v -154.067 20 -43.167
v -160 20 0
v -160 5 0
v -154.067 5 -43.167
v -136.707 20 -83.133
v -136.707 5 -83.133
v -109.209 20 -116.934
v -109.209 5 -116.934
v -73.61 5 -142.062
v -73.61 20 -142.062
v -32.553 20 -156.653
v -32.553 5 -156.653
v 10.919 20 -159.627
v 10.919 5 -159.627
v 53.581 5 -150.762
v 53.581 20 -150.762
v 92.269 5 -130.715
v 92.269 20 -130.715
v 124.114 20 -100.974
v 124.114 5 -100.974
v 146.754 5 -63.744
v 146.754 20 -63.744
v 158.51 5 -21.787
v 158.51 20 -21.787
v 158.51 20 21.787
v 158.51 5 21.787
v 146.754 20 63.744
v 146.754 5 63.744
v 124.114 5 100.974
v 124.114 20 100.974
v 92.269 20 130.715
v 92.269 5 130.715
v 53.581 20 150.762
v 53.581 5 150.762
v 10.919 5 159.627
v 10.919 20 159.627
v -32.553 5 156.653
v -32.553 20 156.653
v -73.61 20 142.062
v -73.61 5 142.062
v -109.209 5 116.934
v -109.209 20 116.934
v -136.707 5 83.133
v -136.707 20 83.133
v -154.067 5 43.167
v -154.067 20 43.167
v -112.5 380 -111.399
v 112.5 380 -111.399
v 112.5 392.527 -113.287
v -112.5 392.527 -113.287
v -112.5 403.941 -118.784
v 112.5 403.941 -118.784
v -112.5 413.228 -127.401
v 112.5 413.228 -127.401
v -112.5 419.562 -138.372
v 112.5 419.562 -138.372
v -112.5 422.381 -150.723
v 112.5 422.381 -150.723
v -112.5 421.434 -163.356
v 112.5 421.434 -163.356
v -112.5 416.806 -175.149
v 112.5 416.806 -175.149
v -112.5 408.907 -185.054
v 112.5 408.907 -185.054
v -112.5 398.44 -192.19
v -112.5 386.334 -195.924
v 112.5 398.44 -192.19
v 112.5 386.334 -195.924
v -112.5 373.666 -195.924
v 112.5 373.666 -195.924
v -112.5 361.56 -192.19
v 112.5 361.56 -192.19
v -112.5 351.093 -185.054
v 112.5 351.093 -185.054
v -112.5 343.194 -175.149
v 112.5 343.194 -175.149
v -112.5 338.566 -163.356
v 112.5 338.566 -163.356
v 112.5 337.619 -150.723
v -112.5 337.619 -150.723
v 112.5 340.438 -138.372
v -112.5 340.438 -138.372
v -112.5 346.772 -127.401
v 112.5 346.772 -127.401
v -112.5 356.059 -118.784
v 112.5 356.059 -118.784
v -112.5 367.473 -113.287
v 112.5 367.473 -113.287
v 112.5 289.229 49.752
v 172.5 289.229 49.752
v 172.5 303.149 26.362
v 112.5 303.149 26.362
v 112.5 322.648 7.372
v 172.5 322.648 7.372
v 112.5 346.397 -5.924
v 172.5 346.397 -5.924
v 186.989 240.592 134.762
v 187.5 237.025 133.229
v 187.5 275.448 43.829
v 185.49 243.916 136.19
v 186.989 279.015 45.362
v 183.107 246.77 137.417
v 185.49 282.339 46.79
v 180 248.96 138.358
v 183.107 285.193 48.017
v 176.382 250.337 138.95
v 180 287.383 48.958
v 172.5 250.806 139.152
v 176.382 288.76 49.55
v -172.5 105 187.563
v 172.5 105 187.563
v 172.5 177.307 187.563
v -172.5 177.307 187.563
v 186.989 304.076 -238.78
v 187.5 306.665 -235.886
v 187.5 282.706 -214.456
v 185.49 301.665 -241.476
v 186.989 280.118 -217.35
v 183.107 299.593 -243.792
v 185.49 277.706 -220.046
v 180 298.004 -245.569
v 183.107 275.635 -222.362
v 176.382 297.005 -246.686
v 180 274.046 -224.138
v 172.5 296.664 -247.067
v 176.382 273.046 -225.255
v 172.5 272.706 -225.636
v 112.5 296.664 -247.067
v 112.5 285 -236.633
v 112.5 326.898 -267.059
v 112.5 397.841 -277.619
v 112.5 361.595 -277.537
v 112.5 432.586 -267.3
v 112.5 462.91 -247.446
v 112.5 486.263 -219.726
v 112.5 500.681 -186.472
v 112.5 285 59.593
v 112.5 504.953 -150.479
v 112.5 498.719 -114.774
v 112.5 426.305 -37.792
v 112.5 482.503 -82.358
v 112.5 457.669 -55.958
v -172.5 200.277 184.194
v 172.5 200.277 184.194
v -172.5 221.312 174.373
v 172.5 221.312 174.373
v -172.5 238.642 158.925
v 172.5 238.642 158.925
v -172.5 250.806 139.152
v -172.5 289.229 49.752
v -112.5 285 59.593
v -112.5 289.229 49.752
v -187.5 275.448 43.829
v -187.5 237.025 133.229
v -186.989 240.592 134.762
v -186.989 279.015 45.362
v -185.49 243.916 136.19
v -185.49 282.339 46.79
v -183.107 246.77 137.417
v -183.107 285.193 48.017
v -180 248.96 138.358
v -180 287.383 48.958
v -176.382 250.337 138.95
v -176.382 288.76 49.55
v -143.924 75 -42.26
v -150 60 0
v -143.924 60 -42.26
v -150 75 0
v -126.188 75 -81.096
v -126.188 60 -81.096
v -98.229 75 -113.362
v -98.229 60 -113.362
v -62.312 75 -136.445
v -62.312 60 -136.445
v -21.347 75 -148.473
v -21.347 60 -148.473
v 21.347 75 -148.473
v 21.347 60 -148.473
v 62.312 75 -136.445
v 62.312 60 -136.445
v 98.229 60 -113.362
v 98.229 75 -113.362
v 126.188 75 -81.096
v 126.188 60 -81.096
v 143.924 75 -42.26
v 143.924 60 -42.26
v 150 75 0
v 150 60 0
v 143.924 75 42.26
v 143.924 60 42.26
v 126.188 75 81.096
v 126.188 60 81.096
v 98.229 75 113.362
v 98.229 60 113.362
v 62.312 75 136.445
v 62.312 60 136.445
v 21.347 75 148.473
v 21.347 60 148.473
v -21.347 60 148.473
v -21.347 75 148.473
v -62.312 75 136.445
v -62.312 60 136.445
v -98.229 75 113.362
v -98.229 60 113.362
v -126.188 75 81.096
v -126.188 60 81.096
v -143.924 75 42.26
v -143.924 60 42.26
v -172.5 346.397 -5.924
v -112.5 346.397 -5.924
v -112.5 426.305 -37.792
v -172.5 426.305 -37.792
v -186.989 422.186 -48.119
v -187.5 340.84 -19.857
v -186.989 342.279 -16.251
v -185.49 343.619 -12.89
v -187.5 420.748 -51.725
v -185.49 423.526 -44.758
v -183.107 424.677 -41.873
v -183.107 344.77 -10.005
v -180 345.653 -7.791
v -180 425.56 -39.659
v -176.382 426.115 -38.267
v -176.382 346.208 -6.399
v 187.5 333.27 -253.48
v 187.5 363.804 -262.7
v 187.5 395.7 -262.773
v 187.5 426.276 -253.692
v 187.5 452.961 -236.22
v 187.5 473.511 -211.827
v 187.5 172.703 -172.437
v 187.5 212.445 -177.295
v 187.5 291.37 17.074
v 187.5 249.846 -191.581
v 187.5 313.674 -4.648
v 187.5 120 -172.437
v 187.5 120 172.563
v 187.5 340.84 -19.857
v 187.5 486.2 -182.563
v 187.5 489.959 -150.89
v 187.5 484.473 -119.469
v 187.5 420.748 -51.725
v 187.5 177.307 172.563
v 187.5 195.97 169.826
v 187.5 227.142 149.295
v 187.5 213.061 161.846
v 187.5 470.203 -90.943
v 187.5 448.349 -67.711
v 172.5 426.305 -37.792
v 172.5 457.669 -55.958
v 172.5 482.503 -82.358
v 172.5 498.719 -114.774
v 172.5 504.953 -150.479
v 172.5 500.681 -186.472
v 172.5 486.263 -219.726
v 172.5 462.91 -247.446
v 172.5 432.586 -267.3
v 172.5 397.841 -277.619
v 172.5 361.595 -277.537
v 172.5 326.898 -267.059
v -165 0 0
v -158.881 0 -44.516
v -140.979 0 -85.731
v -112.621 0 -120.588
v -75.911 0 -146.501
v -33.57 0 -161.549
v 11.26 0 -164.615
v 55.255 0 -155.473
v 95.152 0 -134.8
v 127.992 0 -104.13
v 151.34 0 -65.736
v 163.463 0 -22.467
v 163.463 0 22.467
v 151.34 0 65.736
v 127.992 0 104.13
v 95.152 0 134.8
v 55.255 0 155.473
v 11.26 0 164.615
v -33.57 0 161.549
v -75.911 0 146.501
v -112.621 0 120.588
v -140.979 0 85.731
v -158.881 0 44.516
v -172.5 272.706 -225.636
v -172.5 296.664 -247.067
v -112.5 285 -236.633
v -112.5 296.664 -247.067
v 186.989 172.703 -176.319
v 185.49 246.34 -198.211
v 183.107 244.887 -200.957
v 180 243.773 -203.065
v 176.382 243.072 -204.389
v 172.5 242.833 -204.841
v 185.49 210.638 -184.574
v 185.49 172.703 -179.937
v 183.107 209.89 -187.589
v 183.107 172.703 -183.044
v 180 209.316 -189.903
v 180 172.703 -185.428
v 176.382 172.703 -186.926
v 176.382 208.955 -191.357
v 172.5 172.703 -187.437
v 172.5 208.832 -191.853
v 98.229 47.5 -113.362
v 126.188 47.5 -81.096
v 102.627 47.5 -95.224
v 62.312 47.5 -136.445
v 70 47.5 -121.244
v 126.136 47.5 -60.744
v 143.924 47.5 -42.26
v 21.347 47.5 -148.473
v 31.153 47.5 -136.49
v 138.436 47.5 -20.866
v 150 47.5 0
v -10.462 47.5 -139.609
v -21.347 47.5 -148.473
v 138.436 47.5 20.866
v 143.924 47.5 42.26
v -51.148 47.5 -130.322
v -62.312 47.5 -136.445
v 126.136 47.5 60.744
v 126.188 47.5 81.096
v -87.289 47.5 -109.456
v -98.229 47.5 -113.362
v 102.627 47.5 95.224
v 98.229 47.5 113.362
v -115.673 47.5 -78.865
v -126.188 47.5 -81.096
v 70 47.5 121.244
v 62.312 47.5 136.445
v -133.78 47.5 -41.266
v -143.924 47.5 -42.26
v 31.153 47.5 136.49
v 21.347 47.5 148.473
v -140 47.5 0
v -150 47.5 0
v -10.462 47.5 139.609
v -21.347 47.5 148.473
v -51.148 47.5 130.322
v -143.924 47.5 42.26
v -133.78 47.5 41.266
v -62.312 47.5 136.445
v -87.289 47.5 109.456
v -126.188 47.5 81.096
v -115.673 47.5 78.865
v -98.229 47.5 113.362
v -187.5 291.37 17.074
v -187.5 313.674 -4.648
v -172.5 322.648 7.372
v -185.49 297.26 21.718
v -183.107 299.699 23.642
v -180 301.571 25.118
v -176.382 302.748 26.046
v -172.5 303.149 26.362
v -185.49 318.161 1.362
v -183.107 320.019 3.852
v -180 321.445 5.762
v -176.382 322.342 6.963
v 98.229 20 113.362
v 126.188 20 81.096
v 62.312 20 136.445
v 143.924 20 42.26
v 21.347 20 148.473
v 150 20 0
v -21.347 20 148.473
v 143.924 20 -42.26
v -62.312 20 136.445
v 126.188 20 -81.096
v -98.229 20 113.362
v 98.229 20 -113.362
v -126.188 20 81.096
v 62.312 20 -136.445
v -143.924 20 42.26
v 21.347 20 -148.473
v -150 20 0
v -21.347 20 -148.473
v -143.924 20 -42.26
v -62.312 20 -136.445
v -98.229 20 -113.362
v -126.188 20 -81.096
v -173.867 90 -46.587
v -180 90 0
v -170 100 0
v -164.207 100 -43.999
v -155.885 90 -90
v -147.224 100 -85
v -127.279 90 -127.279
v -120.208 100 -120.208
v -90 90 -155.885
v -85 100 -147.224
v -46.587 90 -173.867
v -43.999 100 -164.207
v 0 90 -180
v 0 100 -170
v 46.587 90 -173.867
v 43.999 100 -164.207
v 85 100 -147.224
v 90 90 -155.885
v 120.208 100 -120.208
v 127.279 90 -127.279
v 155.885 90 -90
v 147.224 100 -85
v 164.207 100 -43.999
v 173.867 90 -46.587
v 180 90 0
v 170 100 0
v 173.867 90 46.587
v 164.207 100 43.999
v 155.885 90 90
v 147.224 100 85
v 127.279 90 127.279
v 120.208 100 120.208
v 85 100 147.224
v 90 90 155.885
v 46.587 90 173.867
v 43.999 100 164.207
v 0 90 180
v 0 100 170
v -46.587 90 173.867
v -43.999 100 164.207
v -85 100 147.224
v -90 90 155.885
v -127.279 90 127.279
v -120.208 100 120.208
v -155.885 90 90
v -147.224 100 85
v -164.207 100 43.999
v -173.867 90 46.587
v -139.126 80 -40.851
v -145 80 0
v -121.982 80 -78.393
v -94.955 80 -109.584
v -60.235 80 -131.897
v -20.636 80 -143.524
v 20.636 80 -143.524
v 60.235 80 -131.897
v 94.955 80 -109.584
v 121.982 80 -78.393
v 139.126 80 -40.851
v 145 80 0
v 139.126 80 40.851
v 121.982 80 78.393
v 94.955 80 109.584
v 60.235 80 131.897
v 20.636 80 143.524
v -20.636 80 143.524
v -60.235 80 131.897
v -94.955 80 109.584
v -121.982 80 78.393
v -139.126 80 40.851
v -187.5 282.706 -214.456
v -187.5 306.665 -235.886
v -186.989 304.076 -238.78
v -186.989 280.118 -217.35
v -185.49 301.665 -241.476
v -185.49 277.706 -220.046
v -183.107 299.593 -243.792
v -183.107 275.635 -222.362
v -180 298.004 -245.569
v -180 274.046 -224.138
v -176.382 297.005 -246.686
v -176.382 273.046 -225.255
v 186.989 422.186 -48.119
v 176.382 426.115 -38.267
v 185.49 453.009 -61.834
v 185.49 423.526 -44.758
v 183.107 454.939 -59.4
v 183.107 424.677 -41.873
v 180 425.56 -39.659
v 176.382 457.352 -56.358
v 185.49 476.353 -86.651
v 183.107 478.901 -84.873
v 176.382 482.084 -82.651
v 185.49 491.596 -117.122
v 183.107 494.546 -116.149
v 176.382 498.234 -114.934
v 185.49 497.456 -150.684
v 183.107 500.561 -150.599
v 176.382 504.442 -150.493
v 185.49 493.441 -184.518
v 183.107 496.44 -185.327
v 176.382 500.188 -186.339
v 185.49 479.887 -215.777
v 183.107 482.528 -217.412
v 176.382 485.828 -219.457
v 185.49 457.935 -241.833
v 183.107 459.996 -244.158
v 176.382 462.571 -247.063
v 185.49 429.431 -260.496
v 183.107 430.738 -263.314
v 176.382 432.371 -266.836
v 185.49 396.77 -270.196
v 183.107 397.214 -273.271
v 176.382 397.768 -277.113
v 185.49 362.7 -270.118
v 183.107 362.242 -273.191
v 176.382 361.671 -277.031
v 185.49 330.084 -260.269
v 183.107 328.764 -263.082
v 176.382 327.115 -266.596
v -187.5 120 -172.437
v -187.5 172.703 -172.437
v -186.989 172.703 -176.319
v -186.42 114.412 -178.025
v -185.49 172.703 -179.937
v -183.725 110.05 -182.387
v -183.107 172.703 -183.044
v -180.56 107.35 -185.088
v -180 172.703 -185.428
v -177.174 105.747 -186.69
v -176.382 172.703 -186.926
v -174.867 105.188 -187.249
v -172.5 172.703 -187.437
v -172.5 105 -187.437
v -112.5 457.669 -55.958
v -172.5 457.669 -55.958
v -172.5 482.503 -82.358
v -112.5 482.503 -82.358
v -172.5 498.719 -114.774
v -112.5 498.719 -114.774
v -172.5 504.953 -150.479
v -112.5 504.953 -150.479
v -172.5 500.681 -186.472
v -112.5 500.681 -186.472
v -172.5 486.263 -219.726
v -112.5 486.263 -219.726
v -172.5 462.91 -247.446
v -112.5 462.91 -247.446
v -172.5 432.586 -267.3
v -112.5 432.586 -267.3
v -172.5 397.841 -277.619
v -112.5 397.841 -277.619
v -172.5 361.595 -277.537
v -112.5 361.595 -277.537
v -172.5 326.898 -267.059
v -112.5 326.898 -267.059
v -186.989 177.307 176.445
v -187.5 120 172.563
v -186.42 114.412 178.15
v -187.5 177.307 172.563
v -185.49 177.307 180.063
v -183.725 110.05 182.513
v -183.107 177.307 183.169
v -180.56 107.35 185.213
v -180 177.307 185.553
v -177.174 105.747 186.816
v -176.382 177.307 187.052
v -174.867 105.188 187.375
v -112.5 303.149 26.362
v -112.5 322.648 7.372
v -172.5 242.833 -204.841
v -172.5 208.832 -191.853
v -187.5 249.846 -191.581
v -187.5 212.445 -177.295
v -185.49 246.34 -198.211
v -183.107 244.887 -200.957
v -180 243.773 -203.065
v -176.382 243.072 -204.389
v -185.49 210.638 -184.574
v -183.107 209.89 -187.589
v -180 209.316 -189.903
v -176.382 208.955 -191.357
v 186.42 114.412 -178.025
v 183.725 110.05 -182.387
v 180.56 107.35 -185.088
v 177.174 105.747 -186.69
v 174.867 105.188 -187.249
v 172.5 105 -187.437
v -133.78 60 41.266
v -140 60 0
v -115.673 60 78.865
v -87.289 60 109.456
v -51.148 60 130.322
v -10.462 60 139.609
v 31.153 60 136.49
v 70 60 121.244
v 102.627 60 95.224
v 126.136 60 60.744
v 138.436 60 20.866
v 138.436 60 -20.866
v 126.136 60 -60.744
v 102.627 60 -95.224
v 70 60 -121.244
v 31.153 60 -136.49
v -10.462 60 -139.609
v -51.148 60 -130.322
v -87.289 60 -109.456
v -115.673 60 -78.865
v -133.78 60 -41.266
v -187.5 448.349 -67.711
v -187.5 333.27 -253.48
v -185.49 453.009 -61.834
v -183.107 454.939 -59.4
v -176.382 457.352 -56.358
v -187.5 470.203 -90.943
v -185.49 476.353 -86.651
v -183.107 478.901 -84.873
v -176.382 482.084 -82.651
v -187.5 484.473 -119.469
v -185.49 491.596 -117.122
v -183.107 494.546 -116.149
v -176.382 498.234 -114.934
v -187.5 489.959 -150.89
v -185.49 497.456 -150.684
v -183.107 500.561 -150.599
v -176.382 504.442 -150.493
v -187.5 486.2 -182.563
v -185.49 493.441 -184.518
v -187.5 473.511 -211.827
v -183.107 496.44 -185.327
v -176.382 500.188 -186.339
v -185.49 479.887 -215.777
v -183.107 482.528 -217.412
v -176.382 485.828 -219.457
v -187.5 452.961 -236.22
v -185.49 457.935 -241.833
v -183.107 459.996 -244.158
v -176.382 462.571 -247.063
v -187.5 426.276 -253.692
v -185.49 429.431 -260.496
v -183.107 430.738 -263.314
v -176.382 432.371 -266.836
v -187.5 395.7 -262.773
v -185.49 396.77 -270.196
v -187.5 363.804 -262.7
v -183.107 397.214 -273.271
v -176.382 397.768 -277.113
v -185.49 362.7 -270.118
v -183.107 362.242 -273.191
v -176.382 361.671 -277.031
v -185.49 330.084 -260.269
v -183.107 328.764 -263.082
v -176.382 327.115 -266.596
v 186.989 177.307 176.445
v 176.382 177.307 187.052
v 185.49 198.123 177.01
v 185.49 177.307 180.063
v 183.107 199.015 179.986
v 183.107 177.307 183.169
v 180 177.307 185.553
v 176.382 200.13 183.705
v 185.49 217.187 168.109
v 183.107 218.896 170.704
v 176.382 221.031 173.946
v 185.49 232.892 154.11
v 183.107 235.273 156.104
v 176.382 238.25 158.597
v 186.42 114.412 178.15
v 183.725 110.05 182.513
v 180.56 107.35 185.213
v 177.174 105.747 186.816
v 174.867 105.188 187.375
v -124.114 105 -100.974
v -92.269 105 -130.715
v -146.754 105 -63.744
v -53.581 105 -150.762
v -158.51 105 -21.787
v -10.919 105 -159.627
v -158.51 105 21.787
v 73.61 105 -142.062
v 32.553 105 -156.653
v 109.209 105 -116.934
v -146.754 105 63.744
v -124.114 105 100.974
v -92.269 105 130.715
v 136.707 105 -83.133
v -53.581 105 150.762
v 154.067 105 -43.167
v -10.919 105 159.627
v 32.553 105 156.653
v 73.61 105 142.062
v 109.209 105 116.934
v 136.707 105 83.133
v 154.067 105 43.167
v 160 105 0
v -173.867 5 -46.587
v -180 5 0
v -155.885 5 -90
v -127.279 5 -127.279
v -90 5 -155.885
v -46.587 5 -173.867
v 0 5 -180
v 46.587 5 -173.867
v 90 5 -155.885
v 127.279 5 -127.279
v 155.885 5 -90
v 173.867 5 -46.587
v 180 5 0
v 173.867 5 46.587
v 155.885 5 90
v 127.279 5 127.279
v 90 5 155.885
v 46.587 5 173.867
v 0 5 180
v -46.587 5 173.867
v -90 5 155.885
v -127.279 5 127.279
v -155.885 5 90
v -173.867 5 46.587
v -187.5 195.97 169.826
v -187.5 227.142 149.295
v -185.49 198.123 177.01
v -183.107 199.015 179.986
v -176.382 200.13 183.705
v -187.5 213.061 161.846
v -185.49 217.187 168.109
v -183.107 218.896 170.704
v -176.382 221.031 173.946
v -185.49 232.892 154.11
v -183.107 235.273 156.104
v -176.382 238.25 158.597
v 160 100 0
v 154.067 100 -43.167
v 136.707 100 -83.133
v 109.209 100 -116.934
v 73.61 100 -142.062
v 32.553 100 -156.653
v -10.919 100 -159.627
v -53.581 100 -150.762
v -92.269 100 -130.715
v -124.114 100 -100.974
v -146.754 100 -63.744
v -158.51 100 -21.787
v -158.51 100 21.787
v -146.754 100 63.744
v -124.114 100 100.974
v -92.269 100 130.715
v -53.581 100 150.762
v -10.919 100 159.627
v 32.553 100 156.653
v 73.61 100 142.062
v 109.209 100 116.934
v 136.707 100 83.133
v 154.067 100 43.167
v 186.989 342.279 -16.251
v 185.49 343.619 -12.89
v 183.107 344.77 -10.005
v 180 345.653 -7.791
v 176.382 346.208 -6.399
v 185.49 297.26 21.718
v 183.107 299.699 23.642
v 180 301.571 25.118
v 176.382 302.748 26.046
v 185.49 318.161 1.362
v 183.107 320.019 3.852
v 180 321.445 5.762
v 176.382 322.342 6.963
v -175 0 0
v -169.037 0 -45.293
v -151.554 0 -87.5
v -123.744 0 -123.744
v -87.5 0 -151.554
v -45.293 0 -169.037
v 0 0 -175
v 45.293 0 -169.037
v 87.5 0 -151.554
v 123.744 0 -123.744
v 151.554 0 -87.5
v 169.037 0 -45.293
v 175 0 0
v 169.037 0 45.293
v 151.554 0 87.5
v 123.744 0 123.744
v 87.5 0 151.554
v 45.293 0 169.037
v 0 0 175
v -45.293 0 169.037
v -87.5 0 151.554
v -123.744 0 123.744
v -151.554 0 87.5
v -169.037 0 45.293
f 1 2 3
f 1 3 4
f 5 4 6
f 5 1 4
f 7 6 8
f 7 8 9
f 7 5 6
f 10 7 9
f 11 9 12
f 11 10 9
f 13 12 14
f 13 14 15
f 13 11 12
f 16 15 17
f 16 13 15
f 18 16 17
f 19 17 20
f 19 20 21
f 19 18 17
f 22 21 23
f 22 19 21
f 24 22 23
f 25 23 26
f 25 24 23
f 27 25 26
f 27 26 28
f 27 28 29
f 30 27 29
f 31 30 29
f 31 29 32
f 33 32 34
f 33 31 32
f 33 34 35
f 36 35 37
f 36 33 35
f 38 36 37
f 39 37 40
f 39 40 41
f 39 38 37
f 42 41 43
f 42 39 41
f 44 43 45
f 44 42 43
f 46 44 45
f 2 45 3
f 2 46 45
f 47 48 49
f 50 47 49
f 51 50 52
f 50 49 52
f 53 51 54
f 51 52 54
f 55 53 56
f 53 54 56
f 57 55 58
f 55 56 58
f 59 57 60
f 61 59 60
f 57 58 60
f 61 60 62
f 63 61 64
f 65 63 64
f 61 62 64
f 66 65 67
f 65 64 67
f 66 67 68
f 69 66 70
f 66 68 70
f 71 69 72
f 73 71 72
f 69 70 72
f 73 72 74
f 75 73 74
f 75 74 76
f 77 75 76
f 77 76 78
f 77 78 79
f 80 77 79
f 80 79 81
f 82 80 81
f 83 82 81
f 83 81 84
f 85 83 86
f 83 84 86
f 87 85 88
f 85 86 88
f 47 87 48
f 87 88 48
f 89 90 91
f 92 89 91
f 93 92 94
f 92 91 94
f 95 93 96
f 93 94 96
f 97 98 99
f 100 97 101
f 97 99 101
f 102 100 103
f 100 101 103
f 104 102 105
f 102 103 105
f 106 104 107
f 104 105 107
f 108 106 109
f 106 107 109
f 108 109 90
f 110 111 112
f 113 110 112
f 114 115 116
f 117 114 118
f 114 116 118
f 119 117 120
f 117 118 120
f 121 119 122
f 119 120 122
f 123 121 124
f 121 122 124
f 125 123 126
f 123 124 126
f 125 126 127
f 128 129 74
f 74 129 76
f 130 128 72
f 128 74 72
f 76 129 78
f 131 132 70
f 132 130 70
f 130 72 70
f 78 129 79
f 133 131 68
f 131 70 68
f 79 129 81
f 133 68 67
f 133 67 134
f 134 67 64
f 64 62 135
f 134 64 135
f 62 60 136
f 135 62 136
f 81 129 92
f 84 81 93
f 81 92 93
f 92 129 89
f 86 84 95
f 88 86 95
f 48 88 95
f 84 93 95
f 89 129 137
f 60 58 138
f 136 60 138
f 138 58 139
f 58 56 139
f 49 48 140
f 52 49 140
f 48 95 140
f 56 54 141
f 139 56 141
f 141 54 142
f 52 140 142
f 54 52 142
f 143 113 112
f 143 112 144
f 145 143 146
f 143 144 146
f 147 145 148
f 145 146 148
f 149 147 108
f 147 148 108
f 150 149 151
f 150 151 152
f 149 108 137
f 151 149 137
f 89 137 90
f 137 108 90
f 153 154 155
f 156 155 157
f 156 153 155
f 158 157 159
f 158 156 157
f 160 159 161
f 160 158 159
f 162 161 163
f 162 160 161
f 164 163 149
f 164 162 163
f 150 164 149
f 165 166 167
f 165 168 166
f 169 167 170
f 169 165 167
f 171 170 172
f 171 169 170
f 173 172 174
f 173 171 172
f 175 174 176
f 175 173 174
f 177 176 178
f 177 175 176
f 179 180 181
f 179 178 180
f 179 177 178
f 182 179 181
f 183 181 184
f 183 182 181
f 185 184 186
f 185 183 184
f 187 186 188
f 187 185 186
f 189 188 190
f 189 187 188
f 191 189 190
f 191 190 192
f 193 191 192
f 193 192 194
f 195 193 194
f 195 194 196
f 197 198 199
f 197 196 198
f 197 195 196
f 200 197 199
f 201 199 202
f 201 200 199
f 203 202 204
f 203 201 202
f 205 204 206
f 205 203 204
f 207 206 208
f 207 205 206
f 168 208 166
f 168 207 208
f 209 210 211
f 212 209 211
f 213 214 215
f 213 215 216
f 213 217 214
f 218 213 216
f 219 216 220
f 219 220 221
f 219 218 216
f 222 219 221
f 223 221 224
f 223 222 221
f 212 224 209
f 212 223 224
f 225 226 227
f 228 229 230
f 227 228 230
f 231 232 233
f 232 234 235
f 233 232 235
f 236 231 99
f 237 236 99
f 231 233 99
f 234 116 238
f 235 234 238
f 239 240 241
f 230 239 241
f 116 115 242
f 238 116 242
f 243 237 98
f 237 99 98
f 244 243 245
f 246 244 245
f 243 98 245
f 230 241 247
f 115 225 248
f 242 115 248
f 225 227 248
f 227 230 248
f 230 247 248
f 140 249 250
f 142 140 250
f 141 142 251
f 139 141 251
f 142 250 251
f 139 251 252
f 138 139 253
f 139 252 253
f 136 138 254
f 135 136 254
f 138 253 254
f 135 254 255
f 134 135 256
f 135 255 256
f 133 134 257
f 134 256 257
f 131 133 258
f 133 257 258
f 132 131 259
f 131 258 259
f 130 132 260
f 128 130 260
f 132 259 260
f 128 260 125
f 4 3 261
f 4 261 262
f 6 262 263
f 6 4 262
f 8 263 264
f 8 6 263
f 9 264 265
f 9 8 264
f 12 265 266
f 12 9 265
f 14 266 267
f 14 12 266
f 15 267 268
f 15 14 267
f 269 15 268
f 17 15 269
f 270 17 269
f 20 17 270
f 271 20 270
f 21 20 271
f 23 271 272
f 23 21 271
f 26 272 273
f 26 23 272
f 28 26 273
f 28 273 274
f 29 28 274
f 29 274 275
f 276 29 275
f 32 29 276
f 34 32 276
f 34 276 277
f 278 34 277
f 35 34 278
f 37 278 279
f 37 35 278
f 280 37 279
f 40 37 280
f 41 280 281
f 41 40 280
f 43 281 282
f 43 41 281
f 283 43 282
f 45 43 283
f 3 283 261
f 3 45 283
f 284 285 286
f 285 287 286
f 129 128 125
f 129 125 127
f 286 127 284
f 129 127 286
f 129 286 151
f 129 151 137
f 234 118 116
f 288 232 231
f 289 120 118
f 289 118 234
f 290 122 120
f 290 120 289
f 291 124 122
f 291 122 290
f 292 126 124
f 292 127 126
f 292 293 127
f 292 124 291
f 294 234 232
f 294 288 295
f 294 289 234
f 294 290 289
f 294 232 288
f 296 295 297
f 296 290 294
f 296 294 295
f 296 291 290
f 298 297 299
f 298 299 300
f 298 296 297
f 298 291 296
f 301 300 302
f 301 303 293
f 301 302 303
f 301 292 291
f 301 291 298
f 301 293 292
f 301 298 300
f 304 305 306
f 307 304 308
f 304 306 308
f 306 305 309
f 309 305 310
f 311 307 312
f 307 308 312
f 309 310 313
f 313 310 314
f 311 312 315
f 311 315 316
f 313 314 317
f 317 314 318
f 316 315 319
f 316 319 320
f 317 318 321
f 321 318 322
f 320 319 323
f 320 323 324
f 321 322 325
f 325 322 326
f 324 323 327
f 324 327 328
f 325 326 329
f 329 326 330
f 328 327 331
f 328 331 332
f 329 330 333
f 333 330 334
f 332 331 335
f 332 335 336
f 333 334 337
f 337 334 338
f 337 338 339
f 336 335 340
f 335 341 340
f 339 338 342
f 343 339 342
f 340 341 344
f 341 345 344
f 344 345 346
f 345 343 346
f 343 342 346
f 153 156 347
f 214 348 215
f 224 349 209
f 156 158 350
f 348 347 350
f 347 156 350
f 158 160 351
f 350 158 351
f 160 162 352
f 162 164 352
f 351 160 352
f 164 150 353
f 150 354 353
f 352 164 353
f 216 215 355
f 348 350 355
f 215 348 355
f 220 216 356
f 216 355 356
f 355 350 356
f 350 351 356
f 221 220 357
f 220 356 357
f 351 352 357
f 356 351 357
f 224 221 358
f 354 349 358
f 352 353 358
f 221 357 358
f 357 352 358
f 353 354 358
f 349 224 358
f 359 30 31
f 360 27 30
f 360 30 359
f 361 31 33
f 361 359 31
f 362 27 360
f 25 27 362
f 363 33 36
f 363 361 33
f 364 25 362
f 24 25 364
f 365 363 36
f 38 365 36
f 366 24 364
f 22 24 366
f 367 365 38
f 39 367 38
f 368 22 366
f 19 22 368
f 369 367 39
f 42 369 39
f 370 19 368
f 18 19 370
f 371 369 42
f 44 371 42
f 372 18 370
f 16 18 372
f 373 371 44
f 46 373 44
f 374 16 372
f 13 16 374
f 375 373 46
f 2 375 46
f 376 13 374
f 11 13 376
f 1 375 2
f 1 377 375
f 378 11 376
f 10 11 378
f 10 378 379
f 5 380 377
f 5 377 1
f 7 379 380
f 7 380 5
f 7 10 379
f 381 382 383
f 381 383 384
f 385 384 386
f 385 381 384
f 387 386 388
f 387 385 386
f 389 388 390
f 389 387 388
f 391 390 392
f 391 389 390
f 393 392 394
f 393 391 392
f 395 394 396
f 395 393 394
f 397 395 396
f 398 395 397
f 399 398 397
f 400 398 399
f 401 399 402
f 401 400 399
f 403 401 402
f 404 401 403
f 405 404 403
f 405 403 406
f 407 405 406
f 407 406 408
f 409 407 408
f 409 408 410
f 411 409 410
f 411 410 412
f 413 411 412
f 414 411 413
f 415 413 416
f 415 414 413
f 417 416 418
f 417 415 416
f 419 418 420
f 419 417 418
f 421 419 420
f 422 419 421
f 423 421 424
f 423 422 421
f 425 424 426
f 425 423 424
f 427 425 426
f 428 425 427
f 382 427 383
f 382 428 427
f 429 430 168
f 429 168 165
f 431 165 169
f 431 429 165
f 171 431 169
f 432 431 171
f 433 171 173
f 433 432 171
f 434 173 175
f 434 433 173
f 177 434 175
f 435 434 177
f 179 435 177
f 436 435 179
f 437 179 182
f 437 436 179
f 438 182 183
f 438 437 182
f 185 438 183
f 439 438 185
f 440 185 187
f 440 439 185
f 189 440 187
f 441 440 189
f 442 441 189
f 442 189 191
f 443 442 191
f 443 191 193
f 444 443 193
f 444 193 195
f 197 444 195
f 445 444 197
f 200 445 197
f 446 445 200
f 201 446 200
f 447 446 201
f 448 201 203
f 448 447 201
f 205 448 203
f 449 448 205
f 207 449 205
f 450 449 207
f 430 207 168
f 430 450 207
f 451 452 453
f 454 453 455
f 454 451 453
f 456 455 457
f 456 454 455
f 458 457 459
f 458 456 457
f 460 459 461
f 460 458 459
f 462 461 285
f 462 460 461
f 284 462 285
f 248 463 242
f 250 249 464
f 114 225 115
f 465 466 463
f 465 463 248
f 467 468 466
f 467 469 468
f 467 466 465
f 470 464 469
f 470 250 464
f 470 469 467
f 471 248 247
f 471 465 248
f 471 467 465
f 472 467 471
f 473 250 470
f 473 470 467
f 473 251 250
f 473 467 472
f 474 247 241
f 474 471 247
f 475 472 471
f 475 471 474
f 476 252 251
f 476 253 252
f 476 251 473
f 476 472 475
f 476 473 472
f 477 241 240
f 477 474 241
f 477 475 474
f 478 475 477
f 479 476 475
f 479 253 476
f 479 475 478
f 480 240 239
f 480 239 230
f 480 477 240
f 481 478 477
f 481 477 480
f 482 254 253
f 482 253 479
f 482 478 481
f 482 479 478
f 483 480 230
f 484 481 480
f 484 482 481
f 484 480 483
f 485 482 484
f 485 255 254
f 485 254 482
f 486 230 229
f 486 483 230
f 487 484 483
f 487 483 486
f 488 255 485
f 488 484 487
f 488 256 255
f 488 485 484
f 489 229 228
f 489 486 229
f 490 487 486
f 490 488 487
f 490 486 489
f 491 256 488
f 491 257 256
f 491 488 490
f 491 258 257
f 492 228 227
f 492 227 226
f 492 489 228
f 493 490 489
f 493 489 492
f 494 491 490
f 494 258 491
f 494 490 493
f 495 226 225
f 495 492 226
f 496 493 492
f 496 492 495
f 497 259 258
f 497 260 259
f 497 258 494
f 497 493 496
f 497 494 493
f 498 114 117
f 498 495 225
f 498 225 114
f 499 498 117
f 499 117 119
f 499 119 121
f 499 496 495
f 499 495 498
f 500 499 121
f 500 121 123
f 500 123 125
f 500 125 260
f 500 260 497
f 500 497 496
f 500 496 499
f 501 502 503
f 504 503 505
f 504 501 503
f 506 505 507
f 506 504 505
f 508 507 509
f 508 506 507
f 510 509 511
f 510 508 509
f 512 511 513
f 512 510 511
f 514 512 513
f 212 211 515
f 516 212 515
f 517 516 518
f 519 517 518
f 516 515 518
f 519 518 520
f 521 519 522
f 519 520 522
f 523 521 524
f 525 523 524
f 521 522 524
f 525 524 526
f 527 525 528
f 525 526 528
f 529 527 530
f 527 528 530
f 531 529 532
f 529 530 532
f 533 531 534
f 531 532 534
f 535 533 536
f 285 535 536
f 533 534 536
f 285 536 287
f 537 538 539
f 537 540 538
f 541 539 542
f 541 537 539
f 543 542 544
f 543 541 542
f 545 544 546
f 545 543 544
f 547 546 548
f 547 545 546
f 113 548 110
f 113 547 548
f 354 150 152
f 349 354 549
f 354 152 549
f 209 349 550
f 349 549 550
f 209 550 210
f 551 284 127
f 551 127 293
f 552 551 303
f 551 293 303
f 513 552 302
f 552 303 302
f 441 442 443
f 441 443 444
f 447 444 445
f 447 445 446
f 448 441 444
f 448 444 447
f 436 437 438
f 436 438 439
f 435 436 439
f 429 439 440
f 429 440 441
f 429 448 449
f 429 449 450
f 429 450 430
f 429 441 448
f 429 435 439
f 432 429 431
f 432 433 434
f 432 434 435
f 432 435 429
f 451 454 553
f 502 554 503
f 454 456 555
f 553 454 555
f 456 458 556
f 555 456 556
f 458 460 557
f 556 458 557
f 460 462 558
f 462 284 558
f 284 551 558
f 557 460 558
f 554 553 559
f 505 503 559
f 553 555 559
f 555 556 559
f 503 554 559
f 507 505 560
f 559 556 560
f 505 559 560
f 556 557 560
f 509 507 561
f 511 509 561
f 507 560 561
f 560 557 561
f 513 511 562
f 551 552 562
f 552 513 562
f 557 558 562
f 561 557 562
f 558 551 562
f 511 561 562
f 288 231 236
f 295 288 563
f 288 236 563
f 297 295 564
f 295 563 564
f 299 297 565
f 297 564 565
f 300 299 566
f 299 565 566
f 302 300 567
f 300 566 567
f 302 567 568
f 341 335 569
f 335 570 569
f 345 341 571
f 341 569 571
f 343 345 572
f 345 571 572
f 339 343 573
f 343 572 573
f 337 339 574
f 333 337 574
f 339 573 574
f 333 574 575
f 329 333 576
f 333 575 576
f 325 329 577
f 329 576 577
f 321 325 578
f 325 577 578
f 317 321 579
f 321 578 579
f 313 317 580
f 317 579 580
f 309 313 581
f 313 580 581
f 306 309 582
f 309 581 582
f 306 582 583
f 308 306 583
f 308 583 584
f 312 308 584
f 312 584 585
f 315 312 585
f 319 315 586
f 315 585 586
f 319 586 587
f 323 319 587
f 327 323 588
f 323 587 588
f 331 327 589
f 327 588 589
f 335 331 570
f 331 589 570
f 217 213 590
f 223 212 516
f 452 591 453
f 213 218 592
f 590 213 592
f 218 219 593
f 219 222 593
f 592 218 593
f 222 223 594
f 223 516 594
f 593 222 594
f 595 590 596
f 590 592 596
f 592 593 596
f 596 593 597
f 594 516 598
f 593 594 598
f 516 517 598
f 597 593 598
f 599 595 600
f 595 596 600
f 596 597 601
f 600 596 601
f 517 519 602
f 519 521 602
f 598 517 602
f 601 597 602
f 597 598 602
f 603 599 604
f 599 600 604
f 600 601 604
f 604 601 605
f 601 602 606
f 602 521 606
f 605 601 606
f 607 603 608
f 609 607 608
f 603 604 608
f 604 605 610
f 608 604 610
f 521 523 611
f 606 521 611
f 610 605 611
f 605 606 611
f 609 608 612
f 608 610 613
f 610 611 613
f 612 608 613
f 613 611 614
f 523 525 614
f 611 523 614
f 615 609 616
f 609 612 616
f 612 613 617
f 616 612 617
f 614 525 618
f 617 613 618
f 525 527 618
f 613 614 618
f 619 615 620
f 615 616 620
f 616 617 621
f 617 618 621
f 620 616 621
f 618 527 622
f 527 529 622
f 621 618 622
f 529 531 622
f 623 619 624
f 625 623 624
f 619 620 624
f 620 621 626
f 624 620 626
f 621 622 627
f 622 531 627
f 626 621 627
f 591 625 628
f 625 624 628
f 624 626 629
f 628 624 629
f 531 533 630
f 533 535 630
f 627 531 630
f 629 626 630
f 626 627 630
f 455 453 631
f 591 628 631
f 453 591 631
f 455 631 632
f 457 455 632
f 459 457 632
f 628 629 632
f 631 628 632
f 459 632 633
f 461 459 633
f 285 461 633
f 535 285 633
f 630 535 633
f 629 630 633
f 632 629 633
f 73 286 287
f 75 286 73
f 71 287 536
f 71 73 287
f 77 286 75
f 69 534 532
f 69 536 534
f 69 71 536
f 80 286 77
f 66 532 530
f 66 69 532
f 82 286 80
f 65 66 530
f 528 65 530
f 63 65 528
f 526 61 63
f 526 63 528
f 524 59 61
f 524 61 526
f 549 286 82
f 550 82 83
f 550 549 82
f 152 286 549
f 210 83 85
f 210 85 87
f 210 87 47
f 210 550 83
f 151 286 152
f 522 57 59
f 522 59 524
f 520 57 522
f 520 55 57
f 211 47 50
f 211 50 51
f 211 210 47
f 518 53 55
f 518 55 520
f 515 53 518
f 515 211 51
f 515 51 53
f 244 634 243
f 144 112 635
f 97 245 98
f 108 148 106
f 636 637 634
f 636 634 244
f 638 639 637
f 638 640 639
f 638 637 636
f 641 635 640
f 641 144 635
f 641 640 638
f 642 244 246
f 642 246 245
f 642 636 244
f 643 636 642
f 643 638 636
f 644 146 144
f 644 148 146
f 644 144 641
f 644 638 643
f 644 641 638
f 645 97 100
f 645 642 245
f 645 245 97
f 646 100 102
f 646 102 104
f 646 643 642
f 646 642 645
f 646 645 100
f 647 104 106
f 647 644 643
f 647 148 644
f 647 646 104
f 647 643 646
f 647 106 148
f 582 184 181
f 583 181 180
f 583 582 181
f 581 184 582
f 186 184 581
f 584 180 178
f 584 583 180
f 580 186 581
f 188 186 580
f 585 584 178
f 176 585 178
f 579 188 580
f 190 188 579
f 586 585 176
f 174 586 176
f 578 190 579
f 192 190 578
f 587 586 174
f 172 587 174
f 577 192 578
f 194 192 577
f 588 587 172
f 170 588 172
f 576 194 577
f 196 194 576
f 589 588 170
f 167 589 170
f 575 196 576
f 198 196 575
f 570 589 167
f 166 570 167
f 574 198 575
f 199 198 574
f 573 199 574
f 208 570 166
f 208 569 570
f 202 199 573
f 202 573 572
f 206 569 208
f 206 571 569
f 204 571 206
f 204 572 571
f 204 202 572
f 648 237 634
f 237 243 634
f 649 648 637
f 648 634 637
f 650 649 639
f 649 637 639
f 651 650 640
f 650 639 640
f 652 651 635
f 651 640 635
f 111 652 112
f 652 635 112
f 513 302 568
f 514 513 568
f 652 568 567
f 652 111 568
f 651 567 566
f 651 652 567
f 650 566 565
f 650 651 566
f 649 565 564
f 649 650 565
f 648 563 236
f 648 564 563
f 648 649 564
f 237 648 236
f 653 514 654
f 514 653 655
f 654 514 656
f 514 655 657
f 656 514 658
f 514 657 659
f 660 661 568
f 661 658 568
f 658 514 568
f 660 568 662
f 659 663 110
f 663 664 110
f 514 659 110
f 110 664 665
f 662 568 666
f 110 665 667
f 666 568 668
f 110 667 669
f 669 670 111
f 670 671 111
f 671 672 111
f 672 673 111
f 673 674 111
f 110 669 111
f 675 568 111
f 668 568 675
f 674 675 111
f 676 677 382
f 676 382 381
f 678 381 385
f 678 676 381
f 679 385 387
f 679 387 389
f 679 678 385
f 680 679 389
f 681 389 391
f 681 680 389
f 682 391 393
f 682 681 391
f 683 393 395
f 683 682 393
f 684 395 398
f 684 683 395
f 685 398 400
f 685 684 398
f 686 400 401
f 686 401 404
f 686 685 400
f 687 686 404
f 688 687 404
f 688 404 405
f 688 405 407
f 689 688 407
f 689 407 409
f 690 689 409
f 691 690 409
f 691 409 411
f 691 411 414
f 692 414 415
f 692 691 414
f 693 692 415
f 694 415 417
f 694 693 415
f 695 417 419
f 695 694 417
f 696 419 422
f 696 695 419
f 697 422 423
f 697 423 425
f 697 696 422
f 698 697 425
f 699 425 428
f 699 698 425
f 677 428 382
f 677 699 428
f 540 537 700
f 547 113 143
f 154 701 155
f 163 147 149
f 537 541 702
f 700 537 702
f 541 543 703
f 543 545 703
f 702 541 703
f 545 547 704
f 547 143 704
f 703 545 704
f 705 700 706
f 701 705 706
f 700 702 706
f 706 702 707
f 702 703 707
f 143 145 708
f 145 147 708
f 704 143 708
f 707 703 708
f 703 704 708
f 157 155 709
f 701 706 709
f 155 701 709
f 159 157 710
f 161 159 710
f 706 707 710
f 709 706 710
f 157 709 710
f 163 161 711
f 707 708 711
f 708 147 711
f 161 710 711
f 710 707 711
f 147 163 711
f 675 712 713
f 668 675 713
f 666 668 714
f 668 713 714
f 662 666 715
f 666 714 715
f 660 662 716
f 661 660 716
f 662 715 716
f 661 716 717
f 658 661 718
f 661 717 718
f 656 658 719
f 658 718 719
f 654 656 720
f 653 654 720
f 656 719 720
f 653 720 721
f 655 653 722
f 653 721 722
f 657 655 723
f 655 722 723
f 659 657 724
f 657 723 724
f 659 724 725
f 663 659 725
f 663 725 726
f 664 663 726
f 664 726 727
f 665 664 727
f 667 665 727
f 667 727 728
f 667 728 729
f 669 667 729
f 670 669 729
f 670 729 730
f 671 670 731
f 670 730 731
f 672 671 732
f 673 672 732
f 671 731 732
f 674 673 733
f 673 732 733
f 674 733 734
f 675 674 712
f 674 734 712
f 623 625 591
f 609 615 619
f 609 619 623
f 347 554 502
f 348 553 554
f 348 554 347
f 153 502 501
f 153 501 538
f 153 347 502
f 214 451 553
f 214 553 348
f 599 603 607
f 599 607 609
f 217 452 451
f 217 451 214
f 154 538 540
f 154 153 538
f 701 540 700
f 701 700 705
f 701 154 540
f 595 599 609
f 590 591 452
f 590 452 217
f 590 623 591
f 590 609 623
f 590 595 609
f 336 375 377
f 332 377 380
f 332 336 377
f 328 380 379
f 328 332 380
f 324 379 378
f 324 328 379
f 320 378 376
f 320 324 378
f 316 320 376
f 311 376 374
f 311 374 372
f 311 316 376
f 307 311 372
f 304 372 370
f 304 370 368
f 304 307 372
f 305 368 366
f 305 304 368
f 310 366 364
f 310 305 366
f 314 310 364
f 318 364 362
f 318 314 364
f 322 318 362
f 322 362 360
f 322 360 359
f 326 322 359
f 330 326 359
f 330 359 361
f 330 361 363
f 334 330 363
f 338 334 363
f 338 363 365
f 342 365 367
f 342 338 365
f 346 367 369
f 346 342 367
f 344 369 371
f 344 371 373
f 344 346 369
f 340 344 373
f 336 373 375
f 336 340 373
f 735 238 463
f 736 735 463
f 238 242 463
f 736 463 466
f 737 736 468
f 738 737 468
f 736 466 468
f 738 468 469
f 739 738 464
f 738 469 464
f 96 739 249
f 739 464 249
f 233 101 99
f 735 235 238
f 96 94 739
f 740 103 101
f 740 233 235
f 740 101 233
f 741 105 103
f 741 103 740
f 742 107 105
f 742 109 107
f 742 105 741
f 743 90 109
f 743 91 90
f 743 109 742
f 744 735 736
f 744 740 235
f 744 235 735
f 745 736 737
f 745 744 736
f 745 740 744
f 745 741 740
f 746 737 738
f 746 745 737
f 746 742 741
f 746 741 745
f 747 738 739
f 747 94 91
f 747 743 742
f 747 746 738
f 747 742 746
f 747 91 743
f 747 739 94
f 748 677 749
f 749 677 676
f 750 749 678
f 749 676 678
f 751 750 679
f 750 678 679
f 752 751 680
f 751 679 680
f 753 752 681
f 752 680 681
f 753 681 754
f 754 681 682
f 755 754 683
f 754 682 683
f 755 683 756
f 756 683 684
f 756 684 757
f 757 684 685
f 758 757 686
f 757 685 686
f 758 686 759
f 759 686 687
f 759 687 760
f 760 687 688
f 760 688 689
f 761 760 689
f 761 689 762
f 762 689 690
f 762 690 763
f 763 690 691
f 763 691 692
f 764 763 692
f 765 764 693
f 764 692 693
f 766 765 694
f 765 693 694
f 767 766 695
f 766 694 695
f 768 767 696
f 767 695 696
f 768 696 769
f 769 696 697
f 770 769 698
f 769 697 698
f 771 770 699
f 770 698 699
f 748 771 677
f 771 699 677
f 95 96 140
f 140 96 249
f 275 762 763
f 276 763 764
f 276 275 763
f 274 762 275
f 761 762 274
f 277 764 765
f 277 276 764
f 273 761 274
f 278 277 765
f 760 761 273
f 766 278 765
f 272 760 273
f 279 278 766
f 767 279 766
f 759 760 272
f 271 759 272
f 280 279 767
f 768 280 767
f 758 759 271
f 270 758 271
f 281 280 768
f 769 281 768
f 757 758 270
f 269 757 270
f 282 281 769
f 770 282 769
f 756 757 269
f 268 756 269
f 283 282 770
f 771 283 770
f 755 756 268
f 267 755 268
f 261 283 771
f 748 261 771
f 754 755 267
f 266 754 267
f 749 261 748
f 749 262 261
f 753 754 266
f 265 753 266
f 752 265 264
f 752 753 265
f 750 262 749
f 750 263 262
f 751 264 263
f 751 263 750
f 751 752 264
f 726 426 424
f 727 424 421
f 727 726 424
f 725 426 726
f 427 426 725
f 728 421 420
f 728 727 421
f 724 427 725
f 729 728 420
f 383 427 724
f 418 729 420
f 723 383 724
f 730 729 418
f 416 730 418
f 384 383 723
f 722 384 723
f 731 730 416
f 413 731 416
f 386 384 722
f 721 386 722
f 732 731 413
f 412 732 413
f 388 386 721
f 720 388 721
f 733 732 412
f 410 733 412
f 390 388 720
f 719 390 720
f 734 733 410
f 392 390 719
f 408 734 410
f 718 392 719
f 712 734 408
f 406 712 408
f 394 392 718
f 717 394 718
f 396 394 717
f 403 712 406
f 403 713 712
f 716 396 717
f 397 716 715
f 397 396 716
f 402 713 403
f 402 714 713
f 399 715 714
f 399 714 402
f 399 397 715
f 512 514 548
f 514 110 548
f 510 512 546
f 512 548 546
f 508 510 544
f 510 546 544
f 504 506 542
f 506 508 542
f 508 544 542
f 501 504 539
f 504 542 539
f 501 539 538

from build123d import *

# Parameters (mm, degrees)
CHAMFER1_SIZE           = 10
CHAMFER2_SIZE           = 5
CHAMFER3_SIZE           = 5
SKETCH4_R               = 160
BOSS_EXTRUDE1_DEPTH     = 5
BOSS_EXTRUDE2_DEPTH     = 187.5
FILLET1_R               = 15
SKETCH6_W               = 225
SKETCH6_H               = 220
CUT_EXTRUDE1_DEPTH      = 188.562818856
CUT_EXTRUDE1_DEPTH_BACK = 279.899051912
SKETCH7_R               = 42.5
BOSS_EXTRUDE3_DEPTH     = 225
SKETCH8_W               = 10
SKETCH8_H               = 12.5


with BuildPart() as part:
    # Sketch2 → Revolve1 (revolve)
    with BuildSketch(Plane.XY):
        Polygon((-160, 0), (-160, 20), (-150, 20), (-150, 80), (0, 80), (0, 100), (-180, 100), (-180, 0), align=None)
    revolve(axis=Axis((0, 100, 0), (0, -1, 0)))

    # Chamfer1
    chamfer1_edges = [part.edges().sort_by_distance(p)[0] for p in [
        (180, 100, 0),
    ]]
    chamfer(chamfer1_edges, length=CHAMFER1_SIZE)

    # Chamfer2
    chamfer2_edges = [part.edges().sort_by_distance(p)[0] for p in [
        (150, 80, 0),
        (160, 0, 0),
    ]]
    chamfer(chamfer2_edges, length=CHAMFER2_SIZE)

    # Chamfer3
    chamfer3_edges = [part.edges().sort_by_distance(p)[0] for p in [
        (180, 0, 0),
    ]]
    chamfer(chamfer3_edges, length=CHAMFER3_SIZE)

    # Sketch4 → Boss-Extrude1 (add)
    with BuildSketch(Plane(origin=(0, 100, 0), x_dir=(1, 0, 0), z_dir=(0, 1, 0))):
        Circle(SKETCH4_R)
    extrude(amount=BOSS_EXTRUDE1_DEPTH)

    # Sketch5 → Boss-Extrude2 (add, symmetric)
    with BuildSketch(Plane(origin=(0, 0, 0), x_dir=(0, 0, -1), z_dir=(1, 0, 0))):
        with BuildLine():
            Line((187.437181144, 105), (-187.562818856, 105))
            Line((-187.562818856, 105), (-187.562818856, 177.307219005))
            ThreePointArc((-187.562818856, 177.307219005), (-174.372707713, 221.312204528), (-139.151850084, 250.806423804))
            Line((-139.151850084, 250.806423804), (-49.751809858, 289.229433552))
            ThreePointArc((-49.751809858, 289.229433552), (-16.228261208, 312.275925599), (5.923948566, 346.397014559))
            Line((5.923948566, 346.397014559), (37.791857566, 426.304637395))
            ThreePointArc((37.791857566, 426.304637395), (219.726126853, 486.262863652), (247.066543683, 296.664422612))
            Line((247.066543683, 296.664422612), (225.636190899, 272.705721163))
            ThreePointArc((225.636190899, 272.705721163), (197.31197189, 226.228029294), (187.437181144, 172.703028297))
            Line((187.437181144, 172.703028297), (187.437181144, 105))
        make_face()
    extrude(amount=BOSS_EXTRUDE2_DEPTH, both=True)

    # Fillet1
    fillet1_edges = [part.edges().sort_by_distance(p)[0] for p in [
        (-187.5, 141.153609503, 187.562818856),
        (-187.5, 105, 0.062818856),
        (-187.5, 138.851514149, -187.437181144),
        (-187.5, 226.228029294, -197.31197189),
        (-187.5, 284.685071887, -236.351367291),
        (-187.5, 486.262863652, -219.726126853),
        (-187.5, 386.350825977, -21.857903066),
        (-187.5, 312.275925599, 16.228261208),
        (-187.5, 270.017928678, 94.451829971),
        (-187.5, 221.312204528, 174.372707713),
        (187.5, 141.153609503, 187.562818856),
        (187.5, 105, 0.062818856),
        (187.5, 138.851514149, -187.437181144),
        (187.5, 226.228029294, -197.31197189),
        (187.5, 284.685071887, -236.351367291),
        (187.5, 486.262863652, -219.726126853),
        (187.5, 386.350825977, -21.857903066),
        (187.5, 312.275925599, 16.228261208),
        (187.5, 270.017928678, 94.451829971),
        (187.5, 221.312204528, 174.372707713),
    ]]
    fillet(fillet1_edges, radius=FILLET1_R)

    # Sketch6 → Cut-Extrude1 (cut, two sides)
    with BuildSketch(Plane.XY) as cut_extrude1_sk:
        with Locations((0, 395)):
            Rectangle(SKETCH6_W, SKETCH6_H)
    extrude(amount=CUT_EXTRUDE1_DEPTH, mode=Mode.SUBTRACT)
    extrude(cut_extrude1_sk.sketch, amount=-CUT_EXTRUDE1_DEPTH_BACK, mode=Mode.SUBTRACT)

    # Sketch7 → Boss-Extrude3 (add)
    with BuildSketch(Plane.ZY.offset(-112.5)):
        with Locations((-153.899051812, 380)):
            Circle(SKETCH7_R)
    extrude(amount=BOSS_EXTRUDE3_DEPTH)

    # Sketch8 → Revolve2 (revolve)
    with BuildSketch(Plane.XY):
        with Locations((-145, 53.75)):
            Rectangle(SKETCH8_W, SKETCH8_H)
    revolve(axis=Axis((0, 0, 0), (0, 1, 0)))


solid = part.part
